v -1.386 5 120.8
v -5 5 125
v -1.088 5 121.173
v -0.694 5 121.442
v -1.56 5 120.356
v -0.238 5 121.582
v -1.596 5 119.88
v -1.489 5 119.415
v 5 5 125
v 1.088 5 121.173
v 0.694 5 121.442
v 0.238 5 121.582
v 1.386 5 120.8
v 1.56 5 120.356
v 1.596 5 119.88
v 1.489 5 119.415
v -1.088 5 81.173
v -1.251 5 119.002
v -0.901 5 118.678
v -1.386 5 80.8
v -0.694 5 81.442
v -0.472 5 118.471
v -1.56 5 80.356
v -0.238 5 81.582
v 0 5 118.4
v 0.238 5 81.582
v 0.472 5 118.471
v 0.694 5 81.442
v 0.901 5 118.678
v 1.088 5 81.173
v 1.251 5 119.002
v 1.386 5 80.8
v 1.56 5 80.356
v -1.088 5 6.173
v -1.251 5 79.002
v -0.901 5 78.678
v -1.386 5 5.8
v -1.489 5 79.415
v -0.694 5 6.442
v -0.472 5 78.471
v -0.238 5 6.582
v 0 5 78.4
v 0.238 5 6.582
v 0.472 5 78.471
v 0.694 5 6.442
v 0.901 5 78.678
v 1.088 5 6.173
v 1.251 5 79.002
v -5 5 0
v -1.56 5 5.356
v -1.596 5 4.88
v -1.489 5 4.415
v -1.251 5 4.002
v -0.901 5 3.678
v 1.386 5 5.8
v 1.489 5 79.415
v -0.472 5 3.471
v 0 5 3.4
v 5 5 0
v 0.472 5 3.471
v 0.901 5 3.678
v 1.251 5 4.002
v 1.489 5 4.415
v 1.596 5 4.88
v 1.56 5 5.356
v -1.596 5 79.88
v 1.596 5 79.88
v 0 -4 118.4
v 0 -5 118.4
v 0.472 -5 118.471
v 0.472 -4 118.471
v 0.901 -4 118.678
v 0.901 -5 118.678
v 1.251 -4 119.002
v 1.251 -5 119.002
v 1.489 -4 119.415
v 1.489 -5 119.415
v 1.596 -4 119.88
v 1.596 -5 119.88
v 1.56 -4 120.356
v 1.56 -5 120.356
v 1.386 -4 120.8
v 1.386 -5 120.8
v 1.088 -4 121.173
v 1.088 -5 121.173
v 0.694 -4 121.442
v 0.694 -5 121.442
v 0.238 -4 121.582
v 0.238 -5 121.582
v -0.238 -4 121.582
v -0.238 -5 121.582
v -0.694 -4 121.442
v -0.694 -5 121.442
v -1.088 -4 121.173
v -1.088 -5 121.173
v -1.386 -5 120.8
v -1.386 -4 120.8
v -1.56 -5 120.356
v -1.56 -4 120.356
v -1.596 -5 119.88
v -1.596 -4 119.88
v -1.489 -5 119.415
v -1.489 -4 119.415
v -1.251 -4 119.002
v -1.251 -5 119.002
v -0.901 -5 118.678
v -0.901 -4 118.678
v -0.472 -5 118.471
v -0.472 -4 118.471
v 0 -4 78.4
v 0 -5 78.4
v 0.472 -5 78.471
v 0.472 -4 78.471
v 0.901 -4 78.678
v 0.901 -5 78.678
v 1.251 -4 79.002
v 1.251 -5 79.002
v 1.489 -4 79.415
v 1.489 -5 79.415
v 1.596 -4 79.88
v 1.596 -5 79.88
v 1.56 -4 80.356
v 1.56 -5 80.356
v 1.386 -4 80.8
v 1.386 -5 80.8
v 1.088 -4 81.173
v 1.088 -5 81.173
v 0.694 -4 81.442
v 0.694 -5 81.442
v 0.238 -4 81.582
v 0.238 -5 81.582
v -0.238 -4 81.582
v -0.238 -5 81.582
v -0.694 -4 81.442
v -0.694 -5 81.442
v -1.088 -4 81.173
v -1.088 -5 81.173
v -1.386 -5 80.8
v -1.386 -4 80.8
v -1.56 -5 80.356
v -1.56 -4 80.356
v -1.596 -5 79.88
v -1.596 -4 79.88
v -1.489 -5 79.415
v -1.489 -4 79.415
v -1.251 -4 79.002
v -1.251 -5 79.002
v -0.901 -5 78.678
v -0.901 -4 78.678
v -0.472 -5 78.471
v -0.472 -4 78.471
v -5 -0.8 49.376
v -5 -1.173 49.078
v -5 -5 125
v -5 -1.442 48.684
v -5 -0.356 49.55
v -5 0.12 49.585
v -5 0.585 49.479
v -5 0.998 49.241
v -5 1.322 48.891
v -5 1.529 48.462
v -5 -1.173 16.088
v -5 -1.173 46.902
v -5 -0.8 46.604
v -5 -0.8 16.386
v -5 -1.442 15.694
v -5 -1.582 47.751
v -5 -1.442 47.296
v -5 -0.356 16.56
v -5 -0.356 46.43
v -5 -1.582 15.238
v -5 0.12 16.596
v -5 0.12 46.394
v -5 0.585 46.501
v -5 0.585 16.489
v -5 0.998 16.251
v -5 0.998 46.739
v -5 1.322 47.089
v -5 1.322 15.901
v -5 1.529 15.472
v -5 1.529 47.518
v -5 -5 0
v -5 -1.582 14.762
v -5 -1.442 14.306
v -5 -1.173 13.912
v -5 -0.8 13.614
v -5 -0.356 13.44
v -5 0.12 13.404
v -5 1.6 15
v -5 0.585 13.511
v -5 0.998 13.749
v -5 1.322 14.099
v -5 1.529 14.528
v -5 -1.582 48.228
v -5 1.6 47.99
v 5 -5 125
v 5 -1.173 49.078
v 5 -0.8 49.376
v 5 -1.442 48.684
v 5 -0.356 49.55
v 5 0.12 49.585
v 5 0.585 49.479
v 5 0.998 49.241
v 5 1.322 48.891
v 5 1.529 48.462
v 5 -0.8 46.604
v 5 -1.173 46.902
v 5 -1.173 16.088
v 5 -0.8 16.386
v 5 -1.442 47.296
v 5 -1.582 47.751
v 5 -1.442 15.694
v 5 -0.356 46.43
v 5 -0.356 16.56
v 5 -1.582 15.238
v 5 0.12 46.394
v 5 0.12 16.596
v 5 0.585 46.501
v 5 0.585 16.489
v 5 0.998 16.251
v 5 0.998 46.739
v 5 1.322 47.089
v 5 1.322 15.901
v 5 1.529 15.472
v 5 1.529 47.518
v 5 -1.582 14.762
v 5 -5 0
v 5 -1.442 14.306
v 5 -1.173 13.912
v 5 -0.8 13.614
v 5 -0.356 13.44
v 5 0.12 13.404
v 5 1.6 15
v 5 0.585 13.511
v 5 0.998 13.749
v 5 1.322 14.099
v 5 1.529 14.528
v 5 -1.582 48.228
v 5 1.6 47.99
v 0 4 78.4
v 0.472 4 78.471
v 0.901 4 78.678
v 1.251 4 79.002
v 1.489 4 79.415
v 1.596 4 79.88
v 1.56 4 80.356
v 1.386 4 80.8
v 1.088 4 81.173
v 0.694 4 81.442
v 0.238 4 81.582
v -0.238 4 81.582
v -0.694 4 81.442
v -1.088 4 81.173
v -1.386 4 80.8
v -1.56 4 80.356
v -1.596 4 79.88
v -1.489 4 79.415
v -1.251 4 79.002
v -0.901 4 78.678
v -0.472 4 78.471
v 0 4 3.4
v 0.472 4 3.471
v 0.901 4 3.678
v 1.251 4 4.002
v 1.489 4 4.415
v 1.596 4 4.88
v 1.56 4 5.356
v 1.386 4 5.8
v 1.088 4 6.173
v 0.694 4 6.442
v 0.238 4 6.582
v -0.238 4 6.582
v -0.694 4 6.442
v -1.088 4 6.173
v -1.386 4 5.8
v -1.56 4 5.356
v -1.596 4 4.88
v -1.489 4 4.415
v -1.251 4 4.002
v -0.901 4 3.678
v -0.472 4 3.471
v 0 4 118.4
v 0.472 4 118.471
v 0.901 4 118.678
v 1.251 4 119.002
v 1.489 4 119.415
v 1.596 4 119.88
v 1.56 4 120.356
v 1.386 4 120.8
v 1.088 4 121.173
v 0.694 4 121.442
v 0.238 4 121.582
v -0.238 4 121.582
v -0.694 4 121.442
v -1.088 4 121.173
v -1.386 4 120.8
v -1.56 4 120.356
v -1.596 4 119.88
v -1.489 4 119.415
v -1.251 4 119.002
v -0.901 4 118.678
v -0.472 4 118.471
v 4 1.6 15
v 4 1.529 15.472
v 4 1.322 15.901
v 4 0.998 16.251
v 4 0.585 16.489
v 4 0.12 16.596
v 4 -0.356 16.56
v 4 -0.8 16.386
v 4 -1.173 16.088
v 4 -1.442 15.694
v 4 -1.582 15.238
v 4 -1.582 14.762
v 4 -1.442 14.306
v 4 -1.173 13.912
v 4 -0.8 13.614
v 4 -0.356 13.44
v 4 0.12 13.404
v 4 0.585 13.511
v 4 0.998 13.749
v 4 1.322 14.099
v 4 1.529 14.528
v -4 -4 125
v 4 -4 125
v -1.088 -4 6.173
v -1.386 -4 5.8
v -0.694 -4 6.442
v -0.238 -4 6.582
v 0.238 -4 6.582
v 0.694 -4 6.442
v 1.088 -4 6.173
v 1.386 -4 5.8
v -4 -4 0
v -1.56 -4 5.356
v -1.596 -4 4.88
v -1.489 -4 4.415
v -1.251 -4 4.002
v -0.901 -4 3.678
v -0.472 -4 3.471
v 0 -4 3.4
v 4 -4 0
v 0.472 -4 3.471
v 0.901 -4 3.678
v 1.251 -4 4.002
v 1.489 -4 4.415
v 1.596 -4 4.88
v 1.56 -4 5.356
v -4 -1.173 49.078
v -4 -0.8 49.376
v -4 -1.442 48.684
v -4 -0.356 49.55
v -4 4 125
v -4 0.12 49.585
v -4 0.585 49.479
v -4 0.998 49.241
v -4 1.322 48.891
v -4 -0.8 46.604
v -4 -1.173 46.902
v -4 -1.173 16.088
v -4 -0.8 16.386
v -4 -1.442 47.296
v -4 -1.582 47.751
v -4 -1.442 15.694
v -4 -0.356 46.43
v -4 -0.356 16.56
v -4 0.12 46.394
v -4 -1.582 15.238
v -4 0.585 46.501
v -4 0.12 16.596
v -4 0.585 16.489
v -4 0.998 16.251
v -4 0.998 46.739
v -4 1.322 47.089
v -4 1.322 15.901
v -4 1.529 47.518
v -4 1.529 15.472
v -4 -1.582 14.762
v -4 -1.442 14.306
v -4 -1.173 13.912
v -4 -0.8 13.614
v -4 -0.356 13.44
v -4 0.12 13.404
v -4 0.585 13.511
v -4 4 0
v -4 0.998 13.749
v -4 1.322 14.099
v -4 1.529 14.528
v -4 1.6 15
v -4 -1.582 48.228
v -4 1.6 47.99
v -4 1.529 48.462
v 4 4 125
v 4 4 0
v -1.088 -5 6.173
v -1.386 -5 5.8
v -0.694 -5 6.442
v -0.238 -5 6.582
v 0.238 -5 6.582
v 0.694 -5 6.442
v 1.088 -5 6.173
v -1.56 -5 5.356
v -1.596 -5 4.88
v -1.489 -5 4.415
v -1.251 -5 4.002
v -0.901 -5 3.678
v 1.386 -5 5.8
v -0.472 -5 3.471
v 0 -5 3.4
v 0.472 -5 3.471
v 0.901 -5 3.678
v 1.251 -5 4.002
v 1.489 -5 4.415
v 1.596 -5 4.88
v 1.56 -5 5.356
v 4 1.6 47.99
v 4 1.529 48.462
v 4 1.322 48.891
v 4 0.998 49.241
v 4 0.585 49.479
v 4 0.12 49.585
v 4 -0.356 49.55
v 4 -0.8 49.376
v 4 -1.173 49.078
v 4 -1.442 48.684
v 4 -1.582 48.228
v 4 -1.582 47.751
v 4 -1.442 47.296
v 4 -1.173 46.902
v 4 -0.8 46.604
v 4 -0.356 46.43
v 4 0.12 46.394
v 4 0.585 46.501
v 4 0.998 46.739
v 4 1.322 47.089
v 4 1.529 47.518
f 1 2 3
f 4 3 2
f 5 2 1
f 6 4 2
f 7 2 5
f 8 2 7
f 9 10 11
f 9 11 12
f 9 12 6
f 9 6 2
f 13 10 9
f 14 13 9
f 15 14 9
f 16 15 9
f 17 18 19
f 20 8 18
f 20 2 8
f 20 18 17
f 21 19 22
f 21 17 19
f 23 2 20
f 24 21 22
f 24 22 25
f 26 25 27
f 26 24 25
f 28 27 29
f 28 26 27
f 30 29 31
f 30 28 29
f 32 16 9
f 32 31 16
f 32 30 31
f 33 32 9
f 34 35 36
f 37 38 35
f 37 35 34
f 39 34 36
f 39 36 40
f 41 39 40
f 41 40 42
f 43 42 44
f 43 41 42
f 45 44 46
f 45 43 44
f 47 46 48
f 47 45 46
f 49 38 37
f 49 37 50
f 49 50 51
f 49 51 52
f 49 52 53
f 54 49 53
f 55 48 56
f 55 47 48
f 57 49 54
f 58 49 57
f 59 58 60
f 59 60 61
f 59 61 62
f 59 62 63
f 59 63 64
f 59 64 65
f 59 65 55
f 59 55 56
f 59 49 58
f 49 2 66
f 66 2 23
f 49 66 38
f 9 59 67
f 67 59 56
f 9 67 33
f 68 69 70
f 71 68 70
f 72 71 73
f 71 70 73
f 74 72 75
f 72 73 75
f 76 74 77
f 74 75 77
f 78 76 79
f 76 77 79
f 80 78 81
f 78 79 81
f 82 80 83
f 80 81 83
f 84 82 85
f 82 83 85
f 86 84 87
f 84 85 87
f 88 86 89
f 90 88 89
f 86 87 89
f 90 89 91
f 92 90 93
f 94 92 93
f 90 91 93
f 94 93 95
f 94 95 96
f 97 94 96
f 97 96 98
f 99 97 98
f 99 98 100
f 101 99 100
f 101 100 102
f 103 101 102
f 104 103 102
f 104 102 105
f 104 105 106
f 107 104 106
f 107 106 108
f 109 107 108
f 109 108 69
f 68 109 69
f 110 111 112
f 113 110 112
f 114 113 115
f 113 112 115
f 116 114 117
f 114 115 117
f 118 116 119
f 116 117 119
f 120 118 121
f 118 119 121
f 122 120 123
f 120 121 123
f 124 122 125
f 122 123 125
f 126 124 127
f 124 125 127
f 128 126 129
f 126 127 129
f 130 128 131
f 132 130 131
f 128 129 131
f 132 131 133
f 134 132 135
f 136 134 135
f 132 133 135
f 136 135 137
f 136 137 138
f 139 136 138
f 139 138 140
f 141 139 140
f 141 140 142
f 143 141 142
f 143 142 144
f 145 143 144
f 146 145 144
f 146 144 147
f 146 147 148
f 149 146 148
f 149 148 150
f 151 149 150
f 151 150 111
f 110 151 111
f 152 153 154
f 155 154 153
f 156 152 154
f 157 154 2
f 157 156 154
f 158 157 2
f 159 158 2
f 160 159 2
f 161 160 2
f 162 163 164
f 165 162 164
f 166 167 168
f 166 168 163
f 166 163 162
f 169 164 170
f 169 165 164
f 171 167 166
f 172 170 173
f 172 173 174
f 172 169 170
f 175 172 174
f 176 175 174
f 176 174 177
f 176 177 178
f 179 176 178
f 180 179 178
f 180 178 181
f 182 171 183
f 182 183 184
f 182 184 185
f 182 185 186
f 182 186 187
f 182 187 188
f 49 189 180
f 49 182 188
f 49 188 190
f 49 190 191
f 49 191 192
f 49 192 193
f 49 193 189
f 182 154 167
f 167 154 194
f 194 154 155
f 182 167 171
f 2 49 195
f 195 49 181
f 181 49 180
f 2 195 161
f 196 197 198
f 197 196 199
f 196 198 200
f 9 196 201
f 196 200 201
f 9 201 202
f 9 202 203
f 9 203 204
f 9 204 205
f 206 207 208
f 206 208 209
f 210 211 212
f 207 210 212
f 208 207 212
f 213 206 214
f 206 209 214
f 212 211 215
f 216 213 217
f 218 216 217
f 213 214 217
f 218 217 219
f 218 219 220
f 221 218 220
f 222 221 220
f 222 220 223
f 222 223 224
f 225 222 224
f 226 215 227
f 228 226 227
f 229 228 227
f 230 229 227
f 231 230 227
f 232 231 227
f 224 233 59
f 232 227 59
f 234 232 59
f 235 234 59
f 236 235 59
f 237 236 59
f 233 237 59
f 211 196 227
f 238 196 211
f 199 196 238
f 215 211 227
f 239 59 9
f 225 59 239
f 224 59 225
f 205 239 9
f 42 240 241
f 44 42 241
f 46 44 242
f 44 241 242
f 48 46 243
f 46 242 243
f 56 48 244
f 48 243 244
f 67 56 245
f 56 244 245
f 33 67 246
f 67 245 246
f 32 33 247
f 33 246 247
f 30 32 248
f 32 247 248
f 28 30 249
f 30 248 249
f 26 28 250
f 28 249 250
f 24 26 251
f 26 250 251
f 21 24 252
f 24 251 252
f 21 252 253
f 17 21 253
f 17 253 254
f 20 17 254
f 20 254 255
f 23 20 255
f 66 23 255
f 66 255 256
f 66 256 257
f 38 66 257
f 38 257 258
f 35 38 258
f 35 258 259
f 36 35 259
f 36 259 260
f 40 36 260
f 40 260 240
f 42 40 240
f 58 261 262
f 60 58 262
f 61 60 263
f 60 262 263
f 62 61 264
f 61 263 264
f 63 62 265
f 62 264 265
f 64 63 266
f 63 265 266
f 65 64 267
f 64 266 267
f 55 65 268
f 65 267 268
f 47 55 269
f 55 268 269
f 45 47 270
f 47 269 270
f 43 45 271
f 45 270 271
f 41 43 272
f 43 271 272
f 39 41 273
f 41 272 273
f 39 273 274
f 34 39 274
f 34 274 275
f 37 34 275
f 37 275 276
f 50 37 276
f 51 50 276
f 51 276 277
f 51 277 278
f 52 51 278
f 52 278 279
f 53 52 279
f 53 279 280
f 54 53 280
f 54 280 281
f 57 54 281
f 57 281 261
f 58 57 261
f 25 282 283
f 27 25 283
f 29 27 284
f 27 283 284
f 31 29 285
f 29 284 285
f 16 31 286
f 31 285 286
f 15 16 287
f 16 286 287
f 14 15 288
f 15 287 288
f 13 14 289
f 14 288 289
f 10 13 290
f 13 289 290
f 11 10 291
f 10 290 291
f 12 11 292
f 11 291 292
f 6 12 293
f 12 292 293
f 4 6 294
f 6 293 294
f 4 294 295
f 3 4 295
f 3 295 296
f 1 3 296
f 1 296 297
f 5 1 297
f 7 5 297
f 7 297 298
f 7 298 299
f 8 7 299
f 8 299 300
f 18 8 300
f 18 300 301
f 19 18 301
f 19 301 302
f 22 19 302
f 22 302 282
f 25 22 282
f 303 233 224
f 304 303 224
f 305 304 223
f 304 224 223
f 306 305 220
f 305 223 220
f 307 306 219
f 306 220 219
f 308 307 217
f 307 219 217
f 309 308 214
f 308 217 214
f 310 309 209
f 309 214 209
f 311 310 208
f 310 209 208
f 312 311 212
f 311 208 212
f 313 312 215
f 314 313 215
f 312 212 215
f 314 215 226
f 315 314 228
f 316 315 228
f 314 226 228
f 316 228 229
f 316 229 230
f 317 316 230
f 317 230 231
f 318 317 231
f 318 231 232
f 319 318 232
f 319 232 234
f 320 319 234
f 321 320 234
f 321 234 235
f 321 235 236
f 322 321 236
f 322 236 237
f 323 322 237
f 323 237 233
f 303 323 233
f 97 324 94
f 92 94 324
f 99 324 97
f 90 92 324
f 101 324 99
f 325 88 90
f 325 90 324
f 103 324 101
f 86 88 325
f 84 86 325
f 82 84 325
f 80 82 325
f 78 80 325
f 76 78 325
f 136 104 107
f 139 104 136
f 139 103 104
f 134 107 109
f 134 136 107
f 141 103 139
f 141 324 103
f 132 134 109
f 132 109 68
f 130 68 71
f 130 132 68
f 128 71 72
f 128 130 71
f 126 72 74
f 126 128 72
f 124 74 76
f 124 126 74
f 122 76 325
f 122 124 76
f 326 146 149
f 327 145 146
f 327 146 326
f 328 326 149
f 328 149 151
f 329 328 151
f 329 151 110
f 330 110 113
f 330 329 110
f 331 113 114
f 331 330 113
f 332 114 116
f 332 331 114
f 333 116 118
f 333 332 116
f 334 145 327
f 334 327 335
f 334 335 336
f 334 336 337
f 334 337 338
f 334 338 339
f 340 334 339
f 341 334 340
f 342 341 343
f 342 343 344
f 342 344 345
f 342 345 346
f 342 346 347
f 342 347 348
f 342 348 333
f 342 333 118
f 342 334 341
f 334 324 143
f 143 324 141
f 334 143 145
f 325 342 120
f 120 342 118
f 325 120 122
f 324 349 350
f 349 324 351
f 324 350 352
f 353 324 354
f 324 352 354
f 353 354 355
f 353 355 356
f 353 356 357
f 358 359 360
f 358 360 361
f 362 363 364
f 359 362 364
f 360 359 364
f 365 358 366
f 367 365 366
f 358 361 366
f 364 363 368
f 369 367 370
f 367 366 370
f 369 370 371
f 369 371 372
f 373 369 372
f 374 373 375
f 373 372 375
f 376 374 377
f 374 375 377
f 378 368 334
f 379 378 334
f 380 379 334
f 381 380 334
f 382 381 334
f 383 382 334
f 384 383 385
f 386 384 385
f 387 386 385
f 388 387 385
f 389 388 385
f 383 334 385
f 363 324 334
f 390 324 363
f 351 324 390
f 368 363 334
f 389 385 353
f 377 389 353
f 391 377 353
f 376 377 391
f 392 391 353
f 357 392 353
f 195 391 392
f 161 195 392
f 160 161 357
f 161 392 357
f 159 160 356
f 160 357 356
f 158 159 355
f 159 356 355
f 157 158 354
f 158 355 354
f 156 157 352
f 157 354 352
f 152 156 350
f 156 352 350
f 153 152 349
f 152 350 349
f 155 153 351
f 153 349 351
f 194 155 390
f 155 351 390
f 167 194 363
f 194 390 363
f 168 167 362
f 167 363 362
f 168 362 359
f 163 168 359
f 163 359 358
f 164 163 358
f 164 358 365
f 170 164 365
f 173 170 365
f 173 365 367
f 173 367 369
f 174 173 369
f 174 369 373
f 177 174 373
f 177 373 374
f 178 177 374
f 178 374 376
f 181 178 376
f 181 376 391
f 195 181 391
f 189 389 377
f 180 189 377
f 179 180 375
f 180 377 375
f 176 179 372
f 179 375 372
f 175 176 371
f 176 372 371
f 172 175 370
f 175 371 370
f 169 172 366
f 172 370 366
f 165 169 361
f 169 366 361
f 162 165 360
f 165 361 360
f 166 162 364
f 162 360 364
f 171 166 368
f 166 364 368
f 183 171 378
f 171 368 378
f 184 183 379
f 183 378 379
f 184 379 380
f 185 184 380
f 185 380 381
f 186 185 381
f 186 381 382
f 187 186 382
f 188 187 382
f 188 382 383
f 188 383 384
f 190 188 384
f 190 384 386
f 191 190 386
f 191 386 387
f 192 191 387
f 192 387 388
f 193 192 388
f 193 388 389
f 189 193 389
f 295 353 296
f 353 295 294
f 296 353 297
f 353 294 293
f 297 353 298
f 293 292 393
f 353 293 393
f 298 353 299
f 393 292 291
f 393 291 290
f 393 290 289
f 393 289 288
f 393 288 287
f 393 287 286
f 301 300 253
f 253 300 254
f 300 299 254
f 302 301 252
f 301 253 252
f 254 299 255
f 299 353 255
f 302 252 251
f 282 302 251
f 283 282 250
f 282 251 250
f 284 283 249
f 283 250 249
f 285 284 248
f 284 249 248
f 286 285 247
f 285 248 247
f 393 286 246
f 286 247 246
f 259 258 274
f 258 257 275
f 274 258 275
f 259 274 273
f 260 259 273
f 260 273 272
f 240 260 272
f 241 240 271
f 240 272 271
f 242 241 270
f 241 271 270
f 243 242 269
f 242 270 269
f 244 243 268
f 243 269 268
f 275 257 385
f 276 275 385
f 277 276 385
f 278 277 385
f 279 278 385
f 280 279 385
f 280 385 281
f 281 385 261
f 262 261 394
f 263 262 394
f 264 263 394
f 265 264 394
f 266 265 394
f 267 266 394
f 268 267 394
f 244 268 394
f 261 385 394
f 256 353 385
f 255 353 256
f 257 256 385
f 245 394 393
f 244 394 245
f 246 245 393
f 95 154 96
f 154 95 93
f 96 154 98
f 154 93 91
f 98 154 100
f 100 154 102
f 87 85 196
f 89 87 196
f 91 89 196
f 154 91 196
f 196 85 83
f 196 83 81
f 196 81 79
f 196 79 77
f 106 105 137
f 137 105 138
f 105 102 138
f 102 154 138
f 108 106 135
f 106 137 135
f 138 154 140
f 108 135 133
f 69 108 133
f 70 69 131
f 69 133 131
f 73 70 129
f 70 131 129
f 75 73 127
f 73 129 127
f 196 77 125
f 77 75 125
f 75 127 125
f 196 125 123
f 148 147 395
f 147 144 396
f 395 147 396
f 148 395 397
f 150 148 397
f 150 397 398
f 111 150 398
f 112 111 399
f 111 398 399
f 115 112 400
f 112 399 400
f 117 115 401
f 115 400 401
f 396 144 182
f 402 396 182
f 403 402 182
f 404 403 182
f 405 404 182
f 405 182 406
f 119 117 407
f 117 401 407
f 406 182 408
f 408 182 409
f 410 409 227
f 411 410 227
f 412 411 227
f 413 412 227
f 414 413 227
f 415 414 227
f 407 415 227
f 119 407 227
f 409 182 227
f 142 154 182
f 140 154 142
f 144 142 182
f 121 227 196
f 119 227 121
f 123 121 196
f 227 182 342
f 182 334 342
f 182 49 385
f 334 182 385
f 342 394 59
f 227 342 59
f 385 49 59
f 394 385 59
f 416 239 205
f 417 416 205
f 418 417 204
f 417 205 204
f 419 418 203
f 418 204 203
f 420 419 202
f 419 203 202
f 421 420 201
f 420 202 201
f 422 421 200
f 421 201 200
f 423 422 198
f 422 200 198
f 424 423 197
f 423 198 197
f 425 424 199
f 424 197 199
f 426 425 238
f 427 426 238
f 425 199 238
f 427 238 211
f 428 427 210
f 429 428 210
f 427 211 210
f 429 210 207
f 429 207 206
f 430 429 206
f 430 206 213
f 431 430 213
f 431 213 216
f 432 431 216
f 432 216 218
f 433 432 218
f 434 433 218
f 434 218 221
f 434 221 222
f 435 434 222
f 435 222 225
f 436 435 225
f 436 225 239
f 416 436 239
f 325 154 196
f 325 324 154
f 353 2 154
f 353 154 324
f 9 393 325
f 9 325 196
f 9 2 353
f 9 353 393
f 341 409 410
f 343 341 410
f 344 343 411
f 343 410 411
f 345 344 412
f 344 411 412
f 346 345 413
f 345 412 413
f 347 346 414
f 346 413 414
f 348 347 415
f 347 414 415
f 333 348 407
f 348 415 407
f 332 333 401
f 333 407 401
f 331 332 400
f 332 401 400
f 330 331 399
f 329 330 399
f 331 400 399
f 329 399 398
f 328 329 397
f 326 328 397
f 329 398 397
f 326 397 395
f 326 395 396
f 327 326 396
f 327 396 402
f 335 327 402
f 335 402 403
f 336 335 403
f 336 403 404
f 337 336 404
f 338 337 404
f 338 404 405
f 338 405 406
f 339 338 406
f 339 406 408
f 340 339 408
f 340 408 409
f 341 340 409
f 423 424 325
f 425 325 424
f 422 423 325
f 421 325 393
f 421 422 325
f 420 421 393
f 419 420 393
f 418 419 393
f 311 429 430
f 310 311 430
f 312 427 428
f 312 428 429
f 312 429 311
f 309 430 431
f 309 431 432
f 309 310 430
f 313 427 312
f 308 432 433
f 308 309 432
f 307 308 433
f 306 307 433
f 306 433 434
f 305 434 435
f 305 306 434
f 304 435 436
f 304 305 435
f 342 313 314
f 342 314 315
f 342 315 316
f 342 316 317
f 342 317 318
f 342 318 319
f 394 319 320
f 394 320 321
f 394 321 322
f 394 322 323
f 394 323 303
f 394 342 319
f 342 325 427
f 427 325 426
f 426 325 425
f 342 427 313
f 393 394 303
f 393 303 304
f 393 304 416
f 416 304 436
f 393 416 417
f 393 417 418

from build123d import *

# Parameters (mm, degrees)
SKETCH_1_W          = 10
SKETCH_1_H          = 10
SKETCH_1_W_2        = 8
SKETCH_1_H_2        = 8
EXTRUDE_1_DEPTH     = 125
SKETCH_2_R          = 1.6
CUT_EXTRUDE_1_DEPTH = 126.49900398
SKETCH_3_R          = 1.6
CUT_EXTRUDE_2_DEPTH = 126.49900398
SKETCH_4_R          = 1.6
CUT_EXTRUDE_3_DEPTH = 126.49900398


with BuildPart() as part:
    # ｽｹｯﾁ1 → ﾎﾞｽ - 押し出し1 (new body)
    with BuildSketch(Plane.XY):
        Rectangle(SKETCH_1_W, SKETCH_1_H)
        Rectangle(SKETCH_1_W_2, SKETCH_1_H_2, mode=Mode.SUBTRACT)
    extrude(amount=EXTRUDE_1_DEPTH)

    # ｽｹｯﾁ2 → ｶｯﾄ - 押し出し1 (cut, through all)
    with BuildSketch(Plane.XZ.offset(5)):
        with Locations(Location((0, 5, 0), (0, 0, 270))):
            Circle(SKETCH_2_R)
        with Locations(Location((0, 80, 0), (0, 0, 270))):
            Circle(SKETCH_2_R)
        with Locations(Location((0, 120, 0), (0, 0, 270))):
            Circle(SKETCH_2_R)
    extrude(amount=-CUT_EXTRUDE_1_DEPTH, mode=Mode.SUBTRACT)

    # ｽｹｯﾁ3 → ｶｯﾄ - 押し出し2 (cut, through all)
    with BuildSketch(Plane(origin=(5, 0, 0), x_dir=(0, 0, -1), z_dir=(1, 0, 0))):
        with Locations(Location((-15, 0, 0), (0, 0, 90))):
            Circle(SKETCH_3_R)
    extrude(amount=-CUT_EXTRUDE_2_DEPTH, mode=Mode.SUBTRACT)

    # ｽｹｯﾁ4 → ｶｯﾄ - 押し出し3 (cut, through all)
    with BuildSketch(Plane(origin=(5, 0, 0), x_dir=(0, 0, -1), z_dir=(1, 0, 0))):
        with Locations(Location((-47.989898732, 0, 0), (0, 0, 90))):
            Circle(SKETCH_4_R)
    extrude(amount=-CUT_EXTRUDE_3_DEPTH, mode=Mode.SUBTRACT)


solid = part.part
